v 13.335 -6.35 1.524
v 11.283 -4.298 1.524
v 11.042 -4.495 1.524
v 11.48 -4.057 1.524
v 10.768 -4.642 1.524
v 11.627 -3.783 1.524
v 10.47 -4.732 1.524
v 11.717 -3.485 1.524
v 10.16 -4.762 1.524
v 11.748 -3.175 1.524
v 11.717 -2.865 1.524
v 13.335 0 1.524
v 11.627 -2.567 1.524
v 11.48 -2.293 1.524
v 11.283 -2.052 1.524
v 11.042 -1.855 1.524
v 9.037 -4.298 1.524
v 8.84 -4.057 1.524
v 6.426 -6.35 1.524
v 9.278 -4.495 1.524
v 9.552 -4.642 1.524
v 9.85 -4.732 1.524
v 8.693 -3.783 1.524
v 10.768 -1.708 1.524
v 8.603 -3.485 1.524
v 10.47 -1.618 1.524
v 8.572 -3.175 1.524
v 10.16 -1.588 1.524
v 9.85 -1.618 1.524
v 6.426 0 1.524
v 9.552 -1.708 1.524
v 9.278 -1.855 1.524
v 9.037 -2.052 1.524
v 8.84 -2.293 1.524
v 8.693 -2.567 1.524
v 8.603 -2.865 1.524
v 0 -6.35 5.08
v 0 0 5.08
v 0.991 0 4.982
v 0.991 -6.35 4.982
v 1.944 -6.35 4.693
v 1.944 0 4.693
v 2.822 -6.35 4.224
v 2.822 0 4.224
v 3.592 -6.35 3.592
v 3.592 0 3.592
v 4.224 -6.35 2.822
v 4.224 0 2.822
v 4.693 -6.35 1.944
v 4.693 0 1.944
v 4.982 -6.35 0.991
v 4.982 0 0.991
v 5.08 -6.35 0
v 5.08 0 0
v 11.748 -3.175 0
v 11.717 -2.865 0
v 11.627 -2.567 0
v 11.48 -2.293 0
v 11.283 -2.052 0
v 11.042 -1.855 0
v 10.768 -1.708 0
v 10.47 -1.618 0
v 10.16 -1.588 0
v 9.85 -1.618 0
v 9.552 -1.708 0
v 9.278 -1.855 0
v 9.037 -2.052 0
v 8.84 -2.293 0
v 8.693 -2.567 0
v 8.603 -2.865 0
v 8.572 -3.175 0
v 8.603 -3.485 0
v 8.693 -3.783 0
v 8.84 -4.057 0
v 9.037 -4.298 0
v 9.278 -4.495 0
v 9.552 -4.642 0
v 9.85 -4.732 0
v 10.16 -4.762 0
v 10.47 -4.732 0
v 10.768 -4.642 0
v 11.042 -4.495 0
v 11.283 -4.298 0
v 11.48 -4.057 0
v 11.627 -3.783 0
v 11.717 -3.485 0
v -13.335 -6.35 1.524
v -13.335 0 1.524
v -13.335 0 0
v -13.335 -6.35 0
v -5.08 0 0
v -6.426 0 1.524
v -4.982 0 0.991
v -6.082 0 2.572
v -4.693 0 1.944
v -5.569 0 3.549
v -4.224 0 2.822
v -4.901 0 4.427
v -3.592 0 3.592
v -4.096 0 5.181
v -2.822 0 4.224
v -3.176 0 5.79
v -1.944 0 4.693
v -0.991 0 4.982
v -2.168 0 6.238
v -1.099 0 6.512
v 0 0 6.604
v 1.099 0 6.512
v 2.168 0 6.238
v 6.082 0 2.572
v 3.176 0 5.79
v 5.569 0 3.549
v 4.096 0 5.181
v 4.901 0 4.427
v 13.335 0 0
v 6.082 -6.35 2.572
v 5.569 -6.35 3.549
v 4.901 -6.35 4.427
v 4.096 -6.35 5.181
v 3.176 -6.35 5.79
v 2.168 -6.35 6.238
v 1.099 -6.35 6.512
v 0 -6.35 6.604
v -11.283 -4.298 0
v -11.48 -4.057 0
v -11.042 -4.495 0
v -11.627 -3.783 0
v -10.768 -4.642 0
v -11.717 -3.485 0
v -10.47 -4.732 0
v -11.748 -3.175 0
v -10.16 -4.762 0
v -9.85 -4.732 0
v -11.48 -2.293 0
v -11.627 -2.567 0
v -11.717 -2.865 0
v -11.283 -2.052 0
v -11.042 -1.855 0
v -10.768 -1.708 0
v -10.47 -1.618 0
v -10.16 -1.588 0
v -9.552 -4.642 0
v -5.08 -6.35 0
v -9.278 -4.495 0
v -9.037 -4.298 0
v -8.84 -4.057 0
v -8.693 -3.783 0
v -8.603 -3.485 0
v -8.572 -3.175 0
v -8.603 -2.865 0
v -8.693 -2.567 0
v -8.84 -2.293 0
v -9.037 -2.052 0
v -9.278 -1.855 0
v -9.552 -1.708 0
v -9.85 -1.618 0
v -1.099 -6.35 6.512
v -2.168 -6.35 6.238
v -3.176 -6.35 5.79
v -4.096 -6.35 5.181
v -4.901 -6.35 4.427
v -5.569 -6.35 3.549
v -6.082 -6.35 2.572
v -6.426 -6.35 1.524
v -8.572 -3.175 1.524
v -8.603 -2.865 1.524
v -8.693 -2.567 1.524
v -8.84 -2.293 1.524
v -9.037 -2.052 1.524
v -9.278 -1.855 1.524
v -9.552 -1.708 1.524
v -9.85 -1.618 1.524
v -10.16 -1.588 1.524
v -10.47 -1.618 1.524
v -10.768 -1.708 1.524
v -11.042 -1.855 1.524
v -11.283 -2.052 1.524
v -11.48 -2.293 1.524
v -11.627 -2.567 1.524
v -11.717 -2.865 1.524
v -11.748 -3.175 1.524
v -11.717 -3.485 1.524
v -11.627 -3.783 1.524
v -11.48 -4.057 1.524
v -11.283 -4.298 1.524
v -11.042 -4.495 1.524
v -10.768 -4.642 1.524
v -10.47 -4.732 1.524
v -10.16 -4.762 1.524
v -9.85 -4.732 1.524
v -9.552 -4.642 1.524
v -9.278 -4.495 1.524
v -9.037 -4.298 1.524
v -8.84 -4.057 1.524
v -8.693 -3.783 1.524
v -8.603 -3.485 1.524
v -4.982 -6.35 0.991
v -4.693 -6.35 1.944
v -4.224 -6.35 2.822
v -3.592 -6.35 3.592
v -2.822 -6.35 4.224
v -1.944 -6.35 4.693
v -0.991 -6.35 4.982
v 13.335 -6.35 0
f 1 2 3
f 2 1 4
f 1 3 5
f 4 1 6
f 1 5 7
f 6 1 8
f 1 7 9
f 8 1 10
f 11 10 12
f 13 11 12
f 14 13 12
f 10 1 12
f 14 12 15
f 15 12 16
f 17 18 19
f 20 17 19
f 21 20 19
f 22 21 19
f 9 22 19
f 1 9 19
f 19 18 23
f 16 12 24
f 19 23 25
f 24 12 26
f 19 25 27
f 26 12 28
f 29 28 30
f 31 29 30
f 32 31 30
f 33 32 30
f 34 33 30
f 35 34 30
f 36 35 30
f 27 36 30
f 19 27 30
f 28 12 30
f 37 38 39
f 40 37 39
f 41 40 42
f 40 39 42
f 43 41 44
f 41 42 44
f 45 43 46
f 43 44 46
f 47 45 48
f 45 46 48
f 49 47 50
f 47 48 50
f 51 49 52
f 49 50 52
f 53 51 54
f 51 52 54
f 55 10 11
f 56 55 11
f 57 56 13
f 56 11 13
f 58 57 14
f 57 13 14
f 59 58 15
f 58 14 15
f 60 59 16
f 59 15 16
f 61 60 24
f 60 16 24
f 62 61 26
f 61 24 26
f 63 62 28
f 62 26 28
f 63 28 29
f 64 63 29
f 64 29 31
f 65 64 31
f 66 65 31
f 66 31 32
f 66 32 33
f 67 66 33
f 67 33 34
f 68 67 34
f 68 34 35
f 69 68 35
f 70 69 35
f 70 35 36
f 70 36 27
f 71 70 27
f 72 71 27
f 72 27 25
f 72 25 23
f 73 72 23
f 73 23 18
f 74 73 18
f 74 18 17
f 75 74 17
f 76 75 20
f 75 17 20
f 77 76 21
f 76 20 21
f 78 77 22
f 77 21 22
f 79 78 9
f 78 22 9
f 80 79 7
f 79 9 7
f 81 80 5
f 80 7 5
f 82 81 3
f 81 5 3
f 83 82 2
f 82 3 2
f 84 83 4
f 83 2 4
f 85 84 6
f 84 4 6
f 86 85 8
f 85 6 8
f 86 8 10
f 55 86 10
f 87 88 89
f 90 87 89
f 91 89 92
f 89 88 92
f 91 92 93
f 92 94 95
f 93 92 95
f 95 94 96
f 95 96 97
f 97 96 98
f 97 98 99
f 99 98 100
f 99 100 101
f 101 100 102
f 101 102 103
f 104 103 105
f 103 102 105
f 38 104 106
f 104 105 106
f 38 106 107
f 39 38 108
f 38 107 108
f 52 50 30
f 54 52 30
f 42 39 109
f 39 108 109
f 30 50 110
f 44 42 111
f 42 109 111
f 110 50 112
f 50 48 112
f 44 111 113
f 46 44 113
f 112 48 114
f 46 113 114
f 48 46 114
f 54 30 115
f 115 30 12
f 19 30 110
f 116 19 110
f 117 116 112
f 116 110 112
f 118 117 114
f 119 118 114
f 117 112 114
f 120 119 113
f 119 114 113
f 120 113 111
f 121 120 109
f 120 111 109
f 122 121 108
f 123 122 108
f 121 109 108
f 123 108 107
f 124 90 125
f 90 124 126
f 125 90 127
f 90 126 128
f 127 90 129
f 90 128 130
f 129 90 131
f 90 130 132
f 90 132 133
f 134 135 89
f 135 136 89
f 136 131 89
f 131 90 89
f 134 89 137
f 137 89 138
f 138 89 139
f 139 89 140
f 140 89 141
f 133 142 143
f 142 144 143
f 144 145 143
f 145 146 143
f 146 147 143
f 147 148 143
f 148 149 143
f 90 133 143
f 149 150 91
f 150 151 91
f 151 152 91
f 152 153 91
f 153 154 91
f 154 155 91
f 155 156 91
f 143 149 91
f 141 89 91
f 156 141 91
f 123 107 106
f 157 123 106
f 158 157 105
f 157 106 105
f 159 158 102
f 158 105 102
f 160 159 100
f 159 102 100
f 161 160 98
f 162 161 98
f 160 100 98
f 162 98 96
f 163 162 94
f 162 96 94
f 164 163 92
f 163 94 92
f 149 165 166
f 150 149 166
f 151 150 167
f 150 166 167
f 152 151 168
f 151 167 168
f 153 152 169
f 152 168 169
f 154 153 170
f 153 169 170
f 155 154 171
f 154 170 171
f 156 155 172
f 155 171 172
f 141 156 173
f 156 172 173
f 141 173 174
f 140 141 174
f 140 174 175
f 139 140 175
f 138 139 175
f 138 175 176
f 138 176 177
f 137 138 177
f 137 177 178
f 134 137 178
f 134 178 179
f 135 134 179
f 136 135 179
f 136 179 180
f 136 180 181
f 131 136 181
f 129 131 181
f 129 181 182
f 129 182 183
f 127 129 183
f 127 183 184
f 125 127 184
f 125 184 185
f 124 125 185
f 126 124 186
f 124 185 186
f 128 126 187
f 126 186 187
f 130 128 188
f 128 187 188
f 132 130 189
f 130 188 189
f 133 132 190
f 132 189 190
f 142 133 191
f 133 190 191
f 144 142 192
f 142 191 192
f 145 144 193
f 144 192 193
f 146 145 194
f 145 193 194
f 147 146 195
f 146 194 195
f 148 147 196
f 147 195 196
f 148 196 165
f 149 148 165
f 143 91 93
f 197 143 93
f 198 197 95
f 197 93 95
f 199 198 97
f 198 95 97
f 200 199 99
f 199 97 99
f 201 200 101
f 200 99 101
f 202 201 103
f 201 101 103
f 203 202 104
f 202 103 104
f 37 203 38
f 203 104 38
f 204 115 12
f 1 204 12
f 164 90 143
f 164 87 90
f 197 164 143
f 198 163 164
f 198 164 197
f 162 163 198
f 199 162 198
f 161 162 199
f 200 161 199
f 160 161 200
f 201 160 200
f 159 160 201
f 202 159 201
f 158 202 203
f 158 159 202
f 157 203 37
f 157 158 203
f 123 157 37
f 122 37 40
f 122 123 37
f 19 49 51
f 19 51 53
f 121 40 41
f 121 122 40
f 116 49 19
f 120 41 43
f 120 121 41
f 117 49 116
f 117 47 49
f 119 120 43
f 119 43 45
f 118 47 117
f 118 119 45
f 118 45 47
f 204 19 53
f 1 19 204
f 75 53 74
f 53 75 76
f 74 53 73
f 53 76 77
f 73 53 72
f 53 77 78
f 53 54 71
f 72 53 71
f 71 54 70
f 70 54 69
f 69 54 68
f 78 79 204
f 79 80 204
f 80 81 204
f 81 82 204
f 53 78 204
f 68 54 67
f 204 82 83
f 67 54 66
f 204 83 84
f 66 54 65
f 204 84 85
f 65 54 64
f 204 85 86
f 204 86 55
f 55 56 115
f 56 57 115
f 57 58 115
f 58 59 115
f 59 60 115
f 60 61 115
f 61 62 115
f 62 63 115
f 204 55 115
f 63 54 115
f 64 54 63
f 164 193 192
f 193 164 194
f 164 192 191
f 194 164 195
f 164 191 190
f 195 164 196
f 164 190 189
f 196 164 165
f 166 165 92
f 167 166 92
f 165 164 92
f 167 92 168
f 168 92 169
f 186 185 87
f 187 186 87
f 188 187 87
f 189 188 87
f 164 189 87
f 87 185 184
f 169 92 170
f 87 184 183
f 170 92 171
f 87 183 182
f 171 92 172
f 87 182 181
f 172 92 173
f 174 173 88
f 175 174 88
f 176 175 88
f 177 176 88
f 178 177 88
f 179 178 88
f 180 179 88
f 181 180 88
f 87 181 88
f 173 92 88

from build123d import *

# Parameters (mm, degrees)
F1_DEPTH = 6.35
F2_R     = 1.5875
F3_DEPTH = 1.525


with BuildPart() as f1:
    # F0 (on Front) → F1 (new body)
    with BuildSketch(Plane.XZ):
        with BuildLine():
            Line((-13.335, 0), (-6.604, 0))
            ThreePointArc((-6.604, 0), (-6.559286, 0.767195), (-6.425748, 1.524))
            Line((-6.425748, 1.524), (-9.251668, 1.524))
            Line((-9.251668, 1.524), (-13.335, 1.524))
            Line((-13.335, 1.524), (-13.335, 0))
        make_face()
        with BuildLine():
            Line((-6.604, 0), (-5.08, 0))
            ThreePointArc((-5.08, 0), (-3.592102, 3.592102), (0, 5.08))
            ThreePointArc((0, 5.08), (3.592102, 3.592102), (5.08, 0))
            Line((5.08, 0), (6.604, 0))
            ThreePointArc((6.604, 0), (6.559286, 0.767195), (6.425748, 1.524))
            ThreePointArc((6.425748, 1.524), (4.095627, 5.180604), (0, 6.604))
            ThreePointArc((0, 6.604), (-4.095627, 5.180604), (-6.425748, 1.524))
            ThreePointArc((-6.425748, 1.524), (-6.559286, 0.767195), (-6.604, 0))
        make_face()
        with BuildLine():
            ThreePointArc((6.425748, 1.524), (6.559286, 0.767195), (6.604, 0))
            Line((6.604, 0), (13.335, 0))
            Line((13.335, 0), (13.335, 1.524))
            Line((13.335, 1.524), (9.251668, 1.524))
            Line((9.251668, 1.524), (6.425748, 1.524))
        make_face()
    extrude(amount=F1_DEPTH)

    # F2 (on face) → F3 (cut, through all)
    with BuildSketch(Plane.XY.offset(1.524)):
        with Locations((10.16, -3.175)):
            Circle(F2_R)
        with Locations((-10.16, -3.175)):
            Circle(F2_R)
    extrude(amount=-F3_DEPTH, mode=Mode.SUBTRACT)


solid = f1.part
